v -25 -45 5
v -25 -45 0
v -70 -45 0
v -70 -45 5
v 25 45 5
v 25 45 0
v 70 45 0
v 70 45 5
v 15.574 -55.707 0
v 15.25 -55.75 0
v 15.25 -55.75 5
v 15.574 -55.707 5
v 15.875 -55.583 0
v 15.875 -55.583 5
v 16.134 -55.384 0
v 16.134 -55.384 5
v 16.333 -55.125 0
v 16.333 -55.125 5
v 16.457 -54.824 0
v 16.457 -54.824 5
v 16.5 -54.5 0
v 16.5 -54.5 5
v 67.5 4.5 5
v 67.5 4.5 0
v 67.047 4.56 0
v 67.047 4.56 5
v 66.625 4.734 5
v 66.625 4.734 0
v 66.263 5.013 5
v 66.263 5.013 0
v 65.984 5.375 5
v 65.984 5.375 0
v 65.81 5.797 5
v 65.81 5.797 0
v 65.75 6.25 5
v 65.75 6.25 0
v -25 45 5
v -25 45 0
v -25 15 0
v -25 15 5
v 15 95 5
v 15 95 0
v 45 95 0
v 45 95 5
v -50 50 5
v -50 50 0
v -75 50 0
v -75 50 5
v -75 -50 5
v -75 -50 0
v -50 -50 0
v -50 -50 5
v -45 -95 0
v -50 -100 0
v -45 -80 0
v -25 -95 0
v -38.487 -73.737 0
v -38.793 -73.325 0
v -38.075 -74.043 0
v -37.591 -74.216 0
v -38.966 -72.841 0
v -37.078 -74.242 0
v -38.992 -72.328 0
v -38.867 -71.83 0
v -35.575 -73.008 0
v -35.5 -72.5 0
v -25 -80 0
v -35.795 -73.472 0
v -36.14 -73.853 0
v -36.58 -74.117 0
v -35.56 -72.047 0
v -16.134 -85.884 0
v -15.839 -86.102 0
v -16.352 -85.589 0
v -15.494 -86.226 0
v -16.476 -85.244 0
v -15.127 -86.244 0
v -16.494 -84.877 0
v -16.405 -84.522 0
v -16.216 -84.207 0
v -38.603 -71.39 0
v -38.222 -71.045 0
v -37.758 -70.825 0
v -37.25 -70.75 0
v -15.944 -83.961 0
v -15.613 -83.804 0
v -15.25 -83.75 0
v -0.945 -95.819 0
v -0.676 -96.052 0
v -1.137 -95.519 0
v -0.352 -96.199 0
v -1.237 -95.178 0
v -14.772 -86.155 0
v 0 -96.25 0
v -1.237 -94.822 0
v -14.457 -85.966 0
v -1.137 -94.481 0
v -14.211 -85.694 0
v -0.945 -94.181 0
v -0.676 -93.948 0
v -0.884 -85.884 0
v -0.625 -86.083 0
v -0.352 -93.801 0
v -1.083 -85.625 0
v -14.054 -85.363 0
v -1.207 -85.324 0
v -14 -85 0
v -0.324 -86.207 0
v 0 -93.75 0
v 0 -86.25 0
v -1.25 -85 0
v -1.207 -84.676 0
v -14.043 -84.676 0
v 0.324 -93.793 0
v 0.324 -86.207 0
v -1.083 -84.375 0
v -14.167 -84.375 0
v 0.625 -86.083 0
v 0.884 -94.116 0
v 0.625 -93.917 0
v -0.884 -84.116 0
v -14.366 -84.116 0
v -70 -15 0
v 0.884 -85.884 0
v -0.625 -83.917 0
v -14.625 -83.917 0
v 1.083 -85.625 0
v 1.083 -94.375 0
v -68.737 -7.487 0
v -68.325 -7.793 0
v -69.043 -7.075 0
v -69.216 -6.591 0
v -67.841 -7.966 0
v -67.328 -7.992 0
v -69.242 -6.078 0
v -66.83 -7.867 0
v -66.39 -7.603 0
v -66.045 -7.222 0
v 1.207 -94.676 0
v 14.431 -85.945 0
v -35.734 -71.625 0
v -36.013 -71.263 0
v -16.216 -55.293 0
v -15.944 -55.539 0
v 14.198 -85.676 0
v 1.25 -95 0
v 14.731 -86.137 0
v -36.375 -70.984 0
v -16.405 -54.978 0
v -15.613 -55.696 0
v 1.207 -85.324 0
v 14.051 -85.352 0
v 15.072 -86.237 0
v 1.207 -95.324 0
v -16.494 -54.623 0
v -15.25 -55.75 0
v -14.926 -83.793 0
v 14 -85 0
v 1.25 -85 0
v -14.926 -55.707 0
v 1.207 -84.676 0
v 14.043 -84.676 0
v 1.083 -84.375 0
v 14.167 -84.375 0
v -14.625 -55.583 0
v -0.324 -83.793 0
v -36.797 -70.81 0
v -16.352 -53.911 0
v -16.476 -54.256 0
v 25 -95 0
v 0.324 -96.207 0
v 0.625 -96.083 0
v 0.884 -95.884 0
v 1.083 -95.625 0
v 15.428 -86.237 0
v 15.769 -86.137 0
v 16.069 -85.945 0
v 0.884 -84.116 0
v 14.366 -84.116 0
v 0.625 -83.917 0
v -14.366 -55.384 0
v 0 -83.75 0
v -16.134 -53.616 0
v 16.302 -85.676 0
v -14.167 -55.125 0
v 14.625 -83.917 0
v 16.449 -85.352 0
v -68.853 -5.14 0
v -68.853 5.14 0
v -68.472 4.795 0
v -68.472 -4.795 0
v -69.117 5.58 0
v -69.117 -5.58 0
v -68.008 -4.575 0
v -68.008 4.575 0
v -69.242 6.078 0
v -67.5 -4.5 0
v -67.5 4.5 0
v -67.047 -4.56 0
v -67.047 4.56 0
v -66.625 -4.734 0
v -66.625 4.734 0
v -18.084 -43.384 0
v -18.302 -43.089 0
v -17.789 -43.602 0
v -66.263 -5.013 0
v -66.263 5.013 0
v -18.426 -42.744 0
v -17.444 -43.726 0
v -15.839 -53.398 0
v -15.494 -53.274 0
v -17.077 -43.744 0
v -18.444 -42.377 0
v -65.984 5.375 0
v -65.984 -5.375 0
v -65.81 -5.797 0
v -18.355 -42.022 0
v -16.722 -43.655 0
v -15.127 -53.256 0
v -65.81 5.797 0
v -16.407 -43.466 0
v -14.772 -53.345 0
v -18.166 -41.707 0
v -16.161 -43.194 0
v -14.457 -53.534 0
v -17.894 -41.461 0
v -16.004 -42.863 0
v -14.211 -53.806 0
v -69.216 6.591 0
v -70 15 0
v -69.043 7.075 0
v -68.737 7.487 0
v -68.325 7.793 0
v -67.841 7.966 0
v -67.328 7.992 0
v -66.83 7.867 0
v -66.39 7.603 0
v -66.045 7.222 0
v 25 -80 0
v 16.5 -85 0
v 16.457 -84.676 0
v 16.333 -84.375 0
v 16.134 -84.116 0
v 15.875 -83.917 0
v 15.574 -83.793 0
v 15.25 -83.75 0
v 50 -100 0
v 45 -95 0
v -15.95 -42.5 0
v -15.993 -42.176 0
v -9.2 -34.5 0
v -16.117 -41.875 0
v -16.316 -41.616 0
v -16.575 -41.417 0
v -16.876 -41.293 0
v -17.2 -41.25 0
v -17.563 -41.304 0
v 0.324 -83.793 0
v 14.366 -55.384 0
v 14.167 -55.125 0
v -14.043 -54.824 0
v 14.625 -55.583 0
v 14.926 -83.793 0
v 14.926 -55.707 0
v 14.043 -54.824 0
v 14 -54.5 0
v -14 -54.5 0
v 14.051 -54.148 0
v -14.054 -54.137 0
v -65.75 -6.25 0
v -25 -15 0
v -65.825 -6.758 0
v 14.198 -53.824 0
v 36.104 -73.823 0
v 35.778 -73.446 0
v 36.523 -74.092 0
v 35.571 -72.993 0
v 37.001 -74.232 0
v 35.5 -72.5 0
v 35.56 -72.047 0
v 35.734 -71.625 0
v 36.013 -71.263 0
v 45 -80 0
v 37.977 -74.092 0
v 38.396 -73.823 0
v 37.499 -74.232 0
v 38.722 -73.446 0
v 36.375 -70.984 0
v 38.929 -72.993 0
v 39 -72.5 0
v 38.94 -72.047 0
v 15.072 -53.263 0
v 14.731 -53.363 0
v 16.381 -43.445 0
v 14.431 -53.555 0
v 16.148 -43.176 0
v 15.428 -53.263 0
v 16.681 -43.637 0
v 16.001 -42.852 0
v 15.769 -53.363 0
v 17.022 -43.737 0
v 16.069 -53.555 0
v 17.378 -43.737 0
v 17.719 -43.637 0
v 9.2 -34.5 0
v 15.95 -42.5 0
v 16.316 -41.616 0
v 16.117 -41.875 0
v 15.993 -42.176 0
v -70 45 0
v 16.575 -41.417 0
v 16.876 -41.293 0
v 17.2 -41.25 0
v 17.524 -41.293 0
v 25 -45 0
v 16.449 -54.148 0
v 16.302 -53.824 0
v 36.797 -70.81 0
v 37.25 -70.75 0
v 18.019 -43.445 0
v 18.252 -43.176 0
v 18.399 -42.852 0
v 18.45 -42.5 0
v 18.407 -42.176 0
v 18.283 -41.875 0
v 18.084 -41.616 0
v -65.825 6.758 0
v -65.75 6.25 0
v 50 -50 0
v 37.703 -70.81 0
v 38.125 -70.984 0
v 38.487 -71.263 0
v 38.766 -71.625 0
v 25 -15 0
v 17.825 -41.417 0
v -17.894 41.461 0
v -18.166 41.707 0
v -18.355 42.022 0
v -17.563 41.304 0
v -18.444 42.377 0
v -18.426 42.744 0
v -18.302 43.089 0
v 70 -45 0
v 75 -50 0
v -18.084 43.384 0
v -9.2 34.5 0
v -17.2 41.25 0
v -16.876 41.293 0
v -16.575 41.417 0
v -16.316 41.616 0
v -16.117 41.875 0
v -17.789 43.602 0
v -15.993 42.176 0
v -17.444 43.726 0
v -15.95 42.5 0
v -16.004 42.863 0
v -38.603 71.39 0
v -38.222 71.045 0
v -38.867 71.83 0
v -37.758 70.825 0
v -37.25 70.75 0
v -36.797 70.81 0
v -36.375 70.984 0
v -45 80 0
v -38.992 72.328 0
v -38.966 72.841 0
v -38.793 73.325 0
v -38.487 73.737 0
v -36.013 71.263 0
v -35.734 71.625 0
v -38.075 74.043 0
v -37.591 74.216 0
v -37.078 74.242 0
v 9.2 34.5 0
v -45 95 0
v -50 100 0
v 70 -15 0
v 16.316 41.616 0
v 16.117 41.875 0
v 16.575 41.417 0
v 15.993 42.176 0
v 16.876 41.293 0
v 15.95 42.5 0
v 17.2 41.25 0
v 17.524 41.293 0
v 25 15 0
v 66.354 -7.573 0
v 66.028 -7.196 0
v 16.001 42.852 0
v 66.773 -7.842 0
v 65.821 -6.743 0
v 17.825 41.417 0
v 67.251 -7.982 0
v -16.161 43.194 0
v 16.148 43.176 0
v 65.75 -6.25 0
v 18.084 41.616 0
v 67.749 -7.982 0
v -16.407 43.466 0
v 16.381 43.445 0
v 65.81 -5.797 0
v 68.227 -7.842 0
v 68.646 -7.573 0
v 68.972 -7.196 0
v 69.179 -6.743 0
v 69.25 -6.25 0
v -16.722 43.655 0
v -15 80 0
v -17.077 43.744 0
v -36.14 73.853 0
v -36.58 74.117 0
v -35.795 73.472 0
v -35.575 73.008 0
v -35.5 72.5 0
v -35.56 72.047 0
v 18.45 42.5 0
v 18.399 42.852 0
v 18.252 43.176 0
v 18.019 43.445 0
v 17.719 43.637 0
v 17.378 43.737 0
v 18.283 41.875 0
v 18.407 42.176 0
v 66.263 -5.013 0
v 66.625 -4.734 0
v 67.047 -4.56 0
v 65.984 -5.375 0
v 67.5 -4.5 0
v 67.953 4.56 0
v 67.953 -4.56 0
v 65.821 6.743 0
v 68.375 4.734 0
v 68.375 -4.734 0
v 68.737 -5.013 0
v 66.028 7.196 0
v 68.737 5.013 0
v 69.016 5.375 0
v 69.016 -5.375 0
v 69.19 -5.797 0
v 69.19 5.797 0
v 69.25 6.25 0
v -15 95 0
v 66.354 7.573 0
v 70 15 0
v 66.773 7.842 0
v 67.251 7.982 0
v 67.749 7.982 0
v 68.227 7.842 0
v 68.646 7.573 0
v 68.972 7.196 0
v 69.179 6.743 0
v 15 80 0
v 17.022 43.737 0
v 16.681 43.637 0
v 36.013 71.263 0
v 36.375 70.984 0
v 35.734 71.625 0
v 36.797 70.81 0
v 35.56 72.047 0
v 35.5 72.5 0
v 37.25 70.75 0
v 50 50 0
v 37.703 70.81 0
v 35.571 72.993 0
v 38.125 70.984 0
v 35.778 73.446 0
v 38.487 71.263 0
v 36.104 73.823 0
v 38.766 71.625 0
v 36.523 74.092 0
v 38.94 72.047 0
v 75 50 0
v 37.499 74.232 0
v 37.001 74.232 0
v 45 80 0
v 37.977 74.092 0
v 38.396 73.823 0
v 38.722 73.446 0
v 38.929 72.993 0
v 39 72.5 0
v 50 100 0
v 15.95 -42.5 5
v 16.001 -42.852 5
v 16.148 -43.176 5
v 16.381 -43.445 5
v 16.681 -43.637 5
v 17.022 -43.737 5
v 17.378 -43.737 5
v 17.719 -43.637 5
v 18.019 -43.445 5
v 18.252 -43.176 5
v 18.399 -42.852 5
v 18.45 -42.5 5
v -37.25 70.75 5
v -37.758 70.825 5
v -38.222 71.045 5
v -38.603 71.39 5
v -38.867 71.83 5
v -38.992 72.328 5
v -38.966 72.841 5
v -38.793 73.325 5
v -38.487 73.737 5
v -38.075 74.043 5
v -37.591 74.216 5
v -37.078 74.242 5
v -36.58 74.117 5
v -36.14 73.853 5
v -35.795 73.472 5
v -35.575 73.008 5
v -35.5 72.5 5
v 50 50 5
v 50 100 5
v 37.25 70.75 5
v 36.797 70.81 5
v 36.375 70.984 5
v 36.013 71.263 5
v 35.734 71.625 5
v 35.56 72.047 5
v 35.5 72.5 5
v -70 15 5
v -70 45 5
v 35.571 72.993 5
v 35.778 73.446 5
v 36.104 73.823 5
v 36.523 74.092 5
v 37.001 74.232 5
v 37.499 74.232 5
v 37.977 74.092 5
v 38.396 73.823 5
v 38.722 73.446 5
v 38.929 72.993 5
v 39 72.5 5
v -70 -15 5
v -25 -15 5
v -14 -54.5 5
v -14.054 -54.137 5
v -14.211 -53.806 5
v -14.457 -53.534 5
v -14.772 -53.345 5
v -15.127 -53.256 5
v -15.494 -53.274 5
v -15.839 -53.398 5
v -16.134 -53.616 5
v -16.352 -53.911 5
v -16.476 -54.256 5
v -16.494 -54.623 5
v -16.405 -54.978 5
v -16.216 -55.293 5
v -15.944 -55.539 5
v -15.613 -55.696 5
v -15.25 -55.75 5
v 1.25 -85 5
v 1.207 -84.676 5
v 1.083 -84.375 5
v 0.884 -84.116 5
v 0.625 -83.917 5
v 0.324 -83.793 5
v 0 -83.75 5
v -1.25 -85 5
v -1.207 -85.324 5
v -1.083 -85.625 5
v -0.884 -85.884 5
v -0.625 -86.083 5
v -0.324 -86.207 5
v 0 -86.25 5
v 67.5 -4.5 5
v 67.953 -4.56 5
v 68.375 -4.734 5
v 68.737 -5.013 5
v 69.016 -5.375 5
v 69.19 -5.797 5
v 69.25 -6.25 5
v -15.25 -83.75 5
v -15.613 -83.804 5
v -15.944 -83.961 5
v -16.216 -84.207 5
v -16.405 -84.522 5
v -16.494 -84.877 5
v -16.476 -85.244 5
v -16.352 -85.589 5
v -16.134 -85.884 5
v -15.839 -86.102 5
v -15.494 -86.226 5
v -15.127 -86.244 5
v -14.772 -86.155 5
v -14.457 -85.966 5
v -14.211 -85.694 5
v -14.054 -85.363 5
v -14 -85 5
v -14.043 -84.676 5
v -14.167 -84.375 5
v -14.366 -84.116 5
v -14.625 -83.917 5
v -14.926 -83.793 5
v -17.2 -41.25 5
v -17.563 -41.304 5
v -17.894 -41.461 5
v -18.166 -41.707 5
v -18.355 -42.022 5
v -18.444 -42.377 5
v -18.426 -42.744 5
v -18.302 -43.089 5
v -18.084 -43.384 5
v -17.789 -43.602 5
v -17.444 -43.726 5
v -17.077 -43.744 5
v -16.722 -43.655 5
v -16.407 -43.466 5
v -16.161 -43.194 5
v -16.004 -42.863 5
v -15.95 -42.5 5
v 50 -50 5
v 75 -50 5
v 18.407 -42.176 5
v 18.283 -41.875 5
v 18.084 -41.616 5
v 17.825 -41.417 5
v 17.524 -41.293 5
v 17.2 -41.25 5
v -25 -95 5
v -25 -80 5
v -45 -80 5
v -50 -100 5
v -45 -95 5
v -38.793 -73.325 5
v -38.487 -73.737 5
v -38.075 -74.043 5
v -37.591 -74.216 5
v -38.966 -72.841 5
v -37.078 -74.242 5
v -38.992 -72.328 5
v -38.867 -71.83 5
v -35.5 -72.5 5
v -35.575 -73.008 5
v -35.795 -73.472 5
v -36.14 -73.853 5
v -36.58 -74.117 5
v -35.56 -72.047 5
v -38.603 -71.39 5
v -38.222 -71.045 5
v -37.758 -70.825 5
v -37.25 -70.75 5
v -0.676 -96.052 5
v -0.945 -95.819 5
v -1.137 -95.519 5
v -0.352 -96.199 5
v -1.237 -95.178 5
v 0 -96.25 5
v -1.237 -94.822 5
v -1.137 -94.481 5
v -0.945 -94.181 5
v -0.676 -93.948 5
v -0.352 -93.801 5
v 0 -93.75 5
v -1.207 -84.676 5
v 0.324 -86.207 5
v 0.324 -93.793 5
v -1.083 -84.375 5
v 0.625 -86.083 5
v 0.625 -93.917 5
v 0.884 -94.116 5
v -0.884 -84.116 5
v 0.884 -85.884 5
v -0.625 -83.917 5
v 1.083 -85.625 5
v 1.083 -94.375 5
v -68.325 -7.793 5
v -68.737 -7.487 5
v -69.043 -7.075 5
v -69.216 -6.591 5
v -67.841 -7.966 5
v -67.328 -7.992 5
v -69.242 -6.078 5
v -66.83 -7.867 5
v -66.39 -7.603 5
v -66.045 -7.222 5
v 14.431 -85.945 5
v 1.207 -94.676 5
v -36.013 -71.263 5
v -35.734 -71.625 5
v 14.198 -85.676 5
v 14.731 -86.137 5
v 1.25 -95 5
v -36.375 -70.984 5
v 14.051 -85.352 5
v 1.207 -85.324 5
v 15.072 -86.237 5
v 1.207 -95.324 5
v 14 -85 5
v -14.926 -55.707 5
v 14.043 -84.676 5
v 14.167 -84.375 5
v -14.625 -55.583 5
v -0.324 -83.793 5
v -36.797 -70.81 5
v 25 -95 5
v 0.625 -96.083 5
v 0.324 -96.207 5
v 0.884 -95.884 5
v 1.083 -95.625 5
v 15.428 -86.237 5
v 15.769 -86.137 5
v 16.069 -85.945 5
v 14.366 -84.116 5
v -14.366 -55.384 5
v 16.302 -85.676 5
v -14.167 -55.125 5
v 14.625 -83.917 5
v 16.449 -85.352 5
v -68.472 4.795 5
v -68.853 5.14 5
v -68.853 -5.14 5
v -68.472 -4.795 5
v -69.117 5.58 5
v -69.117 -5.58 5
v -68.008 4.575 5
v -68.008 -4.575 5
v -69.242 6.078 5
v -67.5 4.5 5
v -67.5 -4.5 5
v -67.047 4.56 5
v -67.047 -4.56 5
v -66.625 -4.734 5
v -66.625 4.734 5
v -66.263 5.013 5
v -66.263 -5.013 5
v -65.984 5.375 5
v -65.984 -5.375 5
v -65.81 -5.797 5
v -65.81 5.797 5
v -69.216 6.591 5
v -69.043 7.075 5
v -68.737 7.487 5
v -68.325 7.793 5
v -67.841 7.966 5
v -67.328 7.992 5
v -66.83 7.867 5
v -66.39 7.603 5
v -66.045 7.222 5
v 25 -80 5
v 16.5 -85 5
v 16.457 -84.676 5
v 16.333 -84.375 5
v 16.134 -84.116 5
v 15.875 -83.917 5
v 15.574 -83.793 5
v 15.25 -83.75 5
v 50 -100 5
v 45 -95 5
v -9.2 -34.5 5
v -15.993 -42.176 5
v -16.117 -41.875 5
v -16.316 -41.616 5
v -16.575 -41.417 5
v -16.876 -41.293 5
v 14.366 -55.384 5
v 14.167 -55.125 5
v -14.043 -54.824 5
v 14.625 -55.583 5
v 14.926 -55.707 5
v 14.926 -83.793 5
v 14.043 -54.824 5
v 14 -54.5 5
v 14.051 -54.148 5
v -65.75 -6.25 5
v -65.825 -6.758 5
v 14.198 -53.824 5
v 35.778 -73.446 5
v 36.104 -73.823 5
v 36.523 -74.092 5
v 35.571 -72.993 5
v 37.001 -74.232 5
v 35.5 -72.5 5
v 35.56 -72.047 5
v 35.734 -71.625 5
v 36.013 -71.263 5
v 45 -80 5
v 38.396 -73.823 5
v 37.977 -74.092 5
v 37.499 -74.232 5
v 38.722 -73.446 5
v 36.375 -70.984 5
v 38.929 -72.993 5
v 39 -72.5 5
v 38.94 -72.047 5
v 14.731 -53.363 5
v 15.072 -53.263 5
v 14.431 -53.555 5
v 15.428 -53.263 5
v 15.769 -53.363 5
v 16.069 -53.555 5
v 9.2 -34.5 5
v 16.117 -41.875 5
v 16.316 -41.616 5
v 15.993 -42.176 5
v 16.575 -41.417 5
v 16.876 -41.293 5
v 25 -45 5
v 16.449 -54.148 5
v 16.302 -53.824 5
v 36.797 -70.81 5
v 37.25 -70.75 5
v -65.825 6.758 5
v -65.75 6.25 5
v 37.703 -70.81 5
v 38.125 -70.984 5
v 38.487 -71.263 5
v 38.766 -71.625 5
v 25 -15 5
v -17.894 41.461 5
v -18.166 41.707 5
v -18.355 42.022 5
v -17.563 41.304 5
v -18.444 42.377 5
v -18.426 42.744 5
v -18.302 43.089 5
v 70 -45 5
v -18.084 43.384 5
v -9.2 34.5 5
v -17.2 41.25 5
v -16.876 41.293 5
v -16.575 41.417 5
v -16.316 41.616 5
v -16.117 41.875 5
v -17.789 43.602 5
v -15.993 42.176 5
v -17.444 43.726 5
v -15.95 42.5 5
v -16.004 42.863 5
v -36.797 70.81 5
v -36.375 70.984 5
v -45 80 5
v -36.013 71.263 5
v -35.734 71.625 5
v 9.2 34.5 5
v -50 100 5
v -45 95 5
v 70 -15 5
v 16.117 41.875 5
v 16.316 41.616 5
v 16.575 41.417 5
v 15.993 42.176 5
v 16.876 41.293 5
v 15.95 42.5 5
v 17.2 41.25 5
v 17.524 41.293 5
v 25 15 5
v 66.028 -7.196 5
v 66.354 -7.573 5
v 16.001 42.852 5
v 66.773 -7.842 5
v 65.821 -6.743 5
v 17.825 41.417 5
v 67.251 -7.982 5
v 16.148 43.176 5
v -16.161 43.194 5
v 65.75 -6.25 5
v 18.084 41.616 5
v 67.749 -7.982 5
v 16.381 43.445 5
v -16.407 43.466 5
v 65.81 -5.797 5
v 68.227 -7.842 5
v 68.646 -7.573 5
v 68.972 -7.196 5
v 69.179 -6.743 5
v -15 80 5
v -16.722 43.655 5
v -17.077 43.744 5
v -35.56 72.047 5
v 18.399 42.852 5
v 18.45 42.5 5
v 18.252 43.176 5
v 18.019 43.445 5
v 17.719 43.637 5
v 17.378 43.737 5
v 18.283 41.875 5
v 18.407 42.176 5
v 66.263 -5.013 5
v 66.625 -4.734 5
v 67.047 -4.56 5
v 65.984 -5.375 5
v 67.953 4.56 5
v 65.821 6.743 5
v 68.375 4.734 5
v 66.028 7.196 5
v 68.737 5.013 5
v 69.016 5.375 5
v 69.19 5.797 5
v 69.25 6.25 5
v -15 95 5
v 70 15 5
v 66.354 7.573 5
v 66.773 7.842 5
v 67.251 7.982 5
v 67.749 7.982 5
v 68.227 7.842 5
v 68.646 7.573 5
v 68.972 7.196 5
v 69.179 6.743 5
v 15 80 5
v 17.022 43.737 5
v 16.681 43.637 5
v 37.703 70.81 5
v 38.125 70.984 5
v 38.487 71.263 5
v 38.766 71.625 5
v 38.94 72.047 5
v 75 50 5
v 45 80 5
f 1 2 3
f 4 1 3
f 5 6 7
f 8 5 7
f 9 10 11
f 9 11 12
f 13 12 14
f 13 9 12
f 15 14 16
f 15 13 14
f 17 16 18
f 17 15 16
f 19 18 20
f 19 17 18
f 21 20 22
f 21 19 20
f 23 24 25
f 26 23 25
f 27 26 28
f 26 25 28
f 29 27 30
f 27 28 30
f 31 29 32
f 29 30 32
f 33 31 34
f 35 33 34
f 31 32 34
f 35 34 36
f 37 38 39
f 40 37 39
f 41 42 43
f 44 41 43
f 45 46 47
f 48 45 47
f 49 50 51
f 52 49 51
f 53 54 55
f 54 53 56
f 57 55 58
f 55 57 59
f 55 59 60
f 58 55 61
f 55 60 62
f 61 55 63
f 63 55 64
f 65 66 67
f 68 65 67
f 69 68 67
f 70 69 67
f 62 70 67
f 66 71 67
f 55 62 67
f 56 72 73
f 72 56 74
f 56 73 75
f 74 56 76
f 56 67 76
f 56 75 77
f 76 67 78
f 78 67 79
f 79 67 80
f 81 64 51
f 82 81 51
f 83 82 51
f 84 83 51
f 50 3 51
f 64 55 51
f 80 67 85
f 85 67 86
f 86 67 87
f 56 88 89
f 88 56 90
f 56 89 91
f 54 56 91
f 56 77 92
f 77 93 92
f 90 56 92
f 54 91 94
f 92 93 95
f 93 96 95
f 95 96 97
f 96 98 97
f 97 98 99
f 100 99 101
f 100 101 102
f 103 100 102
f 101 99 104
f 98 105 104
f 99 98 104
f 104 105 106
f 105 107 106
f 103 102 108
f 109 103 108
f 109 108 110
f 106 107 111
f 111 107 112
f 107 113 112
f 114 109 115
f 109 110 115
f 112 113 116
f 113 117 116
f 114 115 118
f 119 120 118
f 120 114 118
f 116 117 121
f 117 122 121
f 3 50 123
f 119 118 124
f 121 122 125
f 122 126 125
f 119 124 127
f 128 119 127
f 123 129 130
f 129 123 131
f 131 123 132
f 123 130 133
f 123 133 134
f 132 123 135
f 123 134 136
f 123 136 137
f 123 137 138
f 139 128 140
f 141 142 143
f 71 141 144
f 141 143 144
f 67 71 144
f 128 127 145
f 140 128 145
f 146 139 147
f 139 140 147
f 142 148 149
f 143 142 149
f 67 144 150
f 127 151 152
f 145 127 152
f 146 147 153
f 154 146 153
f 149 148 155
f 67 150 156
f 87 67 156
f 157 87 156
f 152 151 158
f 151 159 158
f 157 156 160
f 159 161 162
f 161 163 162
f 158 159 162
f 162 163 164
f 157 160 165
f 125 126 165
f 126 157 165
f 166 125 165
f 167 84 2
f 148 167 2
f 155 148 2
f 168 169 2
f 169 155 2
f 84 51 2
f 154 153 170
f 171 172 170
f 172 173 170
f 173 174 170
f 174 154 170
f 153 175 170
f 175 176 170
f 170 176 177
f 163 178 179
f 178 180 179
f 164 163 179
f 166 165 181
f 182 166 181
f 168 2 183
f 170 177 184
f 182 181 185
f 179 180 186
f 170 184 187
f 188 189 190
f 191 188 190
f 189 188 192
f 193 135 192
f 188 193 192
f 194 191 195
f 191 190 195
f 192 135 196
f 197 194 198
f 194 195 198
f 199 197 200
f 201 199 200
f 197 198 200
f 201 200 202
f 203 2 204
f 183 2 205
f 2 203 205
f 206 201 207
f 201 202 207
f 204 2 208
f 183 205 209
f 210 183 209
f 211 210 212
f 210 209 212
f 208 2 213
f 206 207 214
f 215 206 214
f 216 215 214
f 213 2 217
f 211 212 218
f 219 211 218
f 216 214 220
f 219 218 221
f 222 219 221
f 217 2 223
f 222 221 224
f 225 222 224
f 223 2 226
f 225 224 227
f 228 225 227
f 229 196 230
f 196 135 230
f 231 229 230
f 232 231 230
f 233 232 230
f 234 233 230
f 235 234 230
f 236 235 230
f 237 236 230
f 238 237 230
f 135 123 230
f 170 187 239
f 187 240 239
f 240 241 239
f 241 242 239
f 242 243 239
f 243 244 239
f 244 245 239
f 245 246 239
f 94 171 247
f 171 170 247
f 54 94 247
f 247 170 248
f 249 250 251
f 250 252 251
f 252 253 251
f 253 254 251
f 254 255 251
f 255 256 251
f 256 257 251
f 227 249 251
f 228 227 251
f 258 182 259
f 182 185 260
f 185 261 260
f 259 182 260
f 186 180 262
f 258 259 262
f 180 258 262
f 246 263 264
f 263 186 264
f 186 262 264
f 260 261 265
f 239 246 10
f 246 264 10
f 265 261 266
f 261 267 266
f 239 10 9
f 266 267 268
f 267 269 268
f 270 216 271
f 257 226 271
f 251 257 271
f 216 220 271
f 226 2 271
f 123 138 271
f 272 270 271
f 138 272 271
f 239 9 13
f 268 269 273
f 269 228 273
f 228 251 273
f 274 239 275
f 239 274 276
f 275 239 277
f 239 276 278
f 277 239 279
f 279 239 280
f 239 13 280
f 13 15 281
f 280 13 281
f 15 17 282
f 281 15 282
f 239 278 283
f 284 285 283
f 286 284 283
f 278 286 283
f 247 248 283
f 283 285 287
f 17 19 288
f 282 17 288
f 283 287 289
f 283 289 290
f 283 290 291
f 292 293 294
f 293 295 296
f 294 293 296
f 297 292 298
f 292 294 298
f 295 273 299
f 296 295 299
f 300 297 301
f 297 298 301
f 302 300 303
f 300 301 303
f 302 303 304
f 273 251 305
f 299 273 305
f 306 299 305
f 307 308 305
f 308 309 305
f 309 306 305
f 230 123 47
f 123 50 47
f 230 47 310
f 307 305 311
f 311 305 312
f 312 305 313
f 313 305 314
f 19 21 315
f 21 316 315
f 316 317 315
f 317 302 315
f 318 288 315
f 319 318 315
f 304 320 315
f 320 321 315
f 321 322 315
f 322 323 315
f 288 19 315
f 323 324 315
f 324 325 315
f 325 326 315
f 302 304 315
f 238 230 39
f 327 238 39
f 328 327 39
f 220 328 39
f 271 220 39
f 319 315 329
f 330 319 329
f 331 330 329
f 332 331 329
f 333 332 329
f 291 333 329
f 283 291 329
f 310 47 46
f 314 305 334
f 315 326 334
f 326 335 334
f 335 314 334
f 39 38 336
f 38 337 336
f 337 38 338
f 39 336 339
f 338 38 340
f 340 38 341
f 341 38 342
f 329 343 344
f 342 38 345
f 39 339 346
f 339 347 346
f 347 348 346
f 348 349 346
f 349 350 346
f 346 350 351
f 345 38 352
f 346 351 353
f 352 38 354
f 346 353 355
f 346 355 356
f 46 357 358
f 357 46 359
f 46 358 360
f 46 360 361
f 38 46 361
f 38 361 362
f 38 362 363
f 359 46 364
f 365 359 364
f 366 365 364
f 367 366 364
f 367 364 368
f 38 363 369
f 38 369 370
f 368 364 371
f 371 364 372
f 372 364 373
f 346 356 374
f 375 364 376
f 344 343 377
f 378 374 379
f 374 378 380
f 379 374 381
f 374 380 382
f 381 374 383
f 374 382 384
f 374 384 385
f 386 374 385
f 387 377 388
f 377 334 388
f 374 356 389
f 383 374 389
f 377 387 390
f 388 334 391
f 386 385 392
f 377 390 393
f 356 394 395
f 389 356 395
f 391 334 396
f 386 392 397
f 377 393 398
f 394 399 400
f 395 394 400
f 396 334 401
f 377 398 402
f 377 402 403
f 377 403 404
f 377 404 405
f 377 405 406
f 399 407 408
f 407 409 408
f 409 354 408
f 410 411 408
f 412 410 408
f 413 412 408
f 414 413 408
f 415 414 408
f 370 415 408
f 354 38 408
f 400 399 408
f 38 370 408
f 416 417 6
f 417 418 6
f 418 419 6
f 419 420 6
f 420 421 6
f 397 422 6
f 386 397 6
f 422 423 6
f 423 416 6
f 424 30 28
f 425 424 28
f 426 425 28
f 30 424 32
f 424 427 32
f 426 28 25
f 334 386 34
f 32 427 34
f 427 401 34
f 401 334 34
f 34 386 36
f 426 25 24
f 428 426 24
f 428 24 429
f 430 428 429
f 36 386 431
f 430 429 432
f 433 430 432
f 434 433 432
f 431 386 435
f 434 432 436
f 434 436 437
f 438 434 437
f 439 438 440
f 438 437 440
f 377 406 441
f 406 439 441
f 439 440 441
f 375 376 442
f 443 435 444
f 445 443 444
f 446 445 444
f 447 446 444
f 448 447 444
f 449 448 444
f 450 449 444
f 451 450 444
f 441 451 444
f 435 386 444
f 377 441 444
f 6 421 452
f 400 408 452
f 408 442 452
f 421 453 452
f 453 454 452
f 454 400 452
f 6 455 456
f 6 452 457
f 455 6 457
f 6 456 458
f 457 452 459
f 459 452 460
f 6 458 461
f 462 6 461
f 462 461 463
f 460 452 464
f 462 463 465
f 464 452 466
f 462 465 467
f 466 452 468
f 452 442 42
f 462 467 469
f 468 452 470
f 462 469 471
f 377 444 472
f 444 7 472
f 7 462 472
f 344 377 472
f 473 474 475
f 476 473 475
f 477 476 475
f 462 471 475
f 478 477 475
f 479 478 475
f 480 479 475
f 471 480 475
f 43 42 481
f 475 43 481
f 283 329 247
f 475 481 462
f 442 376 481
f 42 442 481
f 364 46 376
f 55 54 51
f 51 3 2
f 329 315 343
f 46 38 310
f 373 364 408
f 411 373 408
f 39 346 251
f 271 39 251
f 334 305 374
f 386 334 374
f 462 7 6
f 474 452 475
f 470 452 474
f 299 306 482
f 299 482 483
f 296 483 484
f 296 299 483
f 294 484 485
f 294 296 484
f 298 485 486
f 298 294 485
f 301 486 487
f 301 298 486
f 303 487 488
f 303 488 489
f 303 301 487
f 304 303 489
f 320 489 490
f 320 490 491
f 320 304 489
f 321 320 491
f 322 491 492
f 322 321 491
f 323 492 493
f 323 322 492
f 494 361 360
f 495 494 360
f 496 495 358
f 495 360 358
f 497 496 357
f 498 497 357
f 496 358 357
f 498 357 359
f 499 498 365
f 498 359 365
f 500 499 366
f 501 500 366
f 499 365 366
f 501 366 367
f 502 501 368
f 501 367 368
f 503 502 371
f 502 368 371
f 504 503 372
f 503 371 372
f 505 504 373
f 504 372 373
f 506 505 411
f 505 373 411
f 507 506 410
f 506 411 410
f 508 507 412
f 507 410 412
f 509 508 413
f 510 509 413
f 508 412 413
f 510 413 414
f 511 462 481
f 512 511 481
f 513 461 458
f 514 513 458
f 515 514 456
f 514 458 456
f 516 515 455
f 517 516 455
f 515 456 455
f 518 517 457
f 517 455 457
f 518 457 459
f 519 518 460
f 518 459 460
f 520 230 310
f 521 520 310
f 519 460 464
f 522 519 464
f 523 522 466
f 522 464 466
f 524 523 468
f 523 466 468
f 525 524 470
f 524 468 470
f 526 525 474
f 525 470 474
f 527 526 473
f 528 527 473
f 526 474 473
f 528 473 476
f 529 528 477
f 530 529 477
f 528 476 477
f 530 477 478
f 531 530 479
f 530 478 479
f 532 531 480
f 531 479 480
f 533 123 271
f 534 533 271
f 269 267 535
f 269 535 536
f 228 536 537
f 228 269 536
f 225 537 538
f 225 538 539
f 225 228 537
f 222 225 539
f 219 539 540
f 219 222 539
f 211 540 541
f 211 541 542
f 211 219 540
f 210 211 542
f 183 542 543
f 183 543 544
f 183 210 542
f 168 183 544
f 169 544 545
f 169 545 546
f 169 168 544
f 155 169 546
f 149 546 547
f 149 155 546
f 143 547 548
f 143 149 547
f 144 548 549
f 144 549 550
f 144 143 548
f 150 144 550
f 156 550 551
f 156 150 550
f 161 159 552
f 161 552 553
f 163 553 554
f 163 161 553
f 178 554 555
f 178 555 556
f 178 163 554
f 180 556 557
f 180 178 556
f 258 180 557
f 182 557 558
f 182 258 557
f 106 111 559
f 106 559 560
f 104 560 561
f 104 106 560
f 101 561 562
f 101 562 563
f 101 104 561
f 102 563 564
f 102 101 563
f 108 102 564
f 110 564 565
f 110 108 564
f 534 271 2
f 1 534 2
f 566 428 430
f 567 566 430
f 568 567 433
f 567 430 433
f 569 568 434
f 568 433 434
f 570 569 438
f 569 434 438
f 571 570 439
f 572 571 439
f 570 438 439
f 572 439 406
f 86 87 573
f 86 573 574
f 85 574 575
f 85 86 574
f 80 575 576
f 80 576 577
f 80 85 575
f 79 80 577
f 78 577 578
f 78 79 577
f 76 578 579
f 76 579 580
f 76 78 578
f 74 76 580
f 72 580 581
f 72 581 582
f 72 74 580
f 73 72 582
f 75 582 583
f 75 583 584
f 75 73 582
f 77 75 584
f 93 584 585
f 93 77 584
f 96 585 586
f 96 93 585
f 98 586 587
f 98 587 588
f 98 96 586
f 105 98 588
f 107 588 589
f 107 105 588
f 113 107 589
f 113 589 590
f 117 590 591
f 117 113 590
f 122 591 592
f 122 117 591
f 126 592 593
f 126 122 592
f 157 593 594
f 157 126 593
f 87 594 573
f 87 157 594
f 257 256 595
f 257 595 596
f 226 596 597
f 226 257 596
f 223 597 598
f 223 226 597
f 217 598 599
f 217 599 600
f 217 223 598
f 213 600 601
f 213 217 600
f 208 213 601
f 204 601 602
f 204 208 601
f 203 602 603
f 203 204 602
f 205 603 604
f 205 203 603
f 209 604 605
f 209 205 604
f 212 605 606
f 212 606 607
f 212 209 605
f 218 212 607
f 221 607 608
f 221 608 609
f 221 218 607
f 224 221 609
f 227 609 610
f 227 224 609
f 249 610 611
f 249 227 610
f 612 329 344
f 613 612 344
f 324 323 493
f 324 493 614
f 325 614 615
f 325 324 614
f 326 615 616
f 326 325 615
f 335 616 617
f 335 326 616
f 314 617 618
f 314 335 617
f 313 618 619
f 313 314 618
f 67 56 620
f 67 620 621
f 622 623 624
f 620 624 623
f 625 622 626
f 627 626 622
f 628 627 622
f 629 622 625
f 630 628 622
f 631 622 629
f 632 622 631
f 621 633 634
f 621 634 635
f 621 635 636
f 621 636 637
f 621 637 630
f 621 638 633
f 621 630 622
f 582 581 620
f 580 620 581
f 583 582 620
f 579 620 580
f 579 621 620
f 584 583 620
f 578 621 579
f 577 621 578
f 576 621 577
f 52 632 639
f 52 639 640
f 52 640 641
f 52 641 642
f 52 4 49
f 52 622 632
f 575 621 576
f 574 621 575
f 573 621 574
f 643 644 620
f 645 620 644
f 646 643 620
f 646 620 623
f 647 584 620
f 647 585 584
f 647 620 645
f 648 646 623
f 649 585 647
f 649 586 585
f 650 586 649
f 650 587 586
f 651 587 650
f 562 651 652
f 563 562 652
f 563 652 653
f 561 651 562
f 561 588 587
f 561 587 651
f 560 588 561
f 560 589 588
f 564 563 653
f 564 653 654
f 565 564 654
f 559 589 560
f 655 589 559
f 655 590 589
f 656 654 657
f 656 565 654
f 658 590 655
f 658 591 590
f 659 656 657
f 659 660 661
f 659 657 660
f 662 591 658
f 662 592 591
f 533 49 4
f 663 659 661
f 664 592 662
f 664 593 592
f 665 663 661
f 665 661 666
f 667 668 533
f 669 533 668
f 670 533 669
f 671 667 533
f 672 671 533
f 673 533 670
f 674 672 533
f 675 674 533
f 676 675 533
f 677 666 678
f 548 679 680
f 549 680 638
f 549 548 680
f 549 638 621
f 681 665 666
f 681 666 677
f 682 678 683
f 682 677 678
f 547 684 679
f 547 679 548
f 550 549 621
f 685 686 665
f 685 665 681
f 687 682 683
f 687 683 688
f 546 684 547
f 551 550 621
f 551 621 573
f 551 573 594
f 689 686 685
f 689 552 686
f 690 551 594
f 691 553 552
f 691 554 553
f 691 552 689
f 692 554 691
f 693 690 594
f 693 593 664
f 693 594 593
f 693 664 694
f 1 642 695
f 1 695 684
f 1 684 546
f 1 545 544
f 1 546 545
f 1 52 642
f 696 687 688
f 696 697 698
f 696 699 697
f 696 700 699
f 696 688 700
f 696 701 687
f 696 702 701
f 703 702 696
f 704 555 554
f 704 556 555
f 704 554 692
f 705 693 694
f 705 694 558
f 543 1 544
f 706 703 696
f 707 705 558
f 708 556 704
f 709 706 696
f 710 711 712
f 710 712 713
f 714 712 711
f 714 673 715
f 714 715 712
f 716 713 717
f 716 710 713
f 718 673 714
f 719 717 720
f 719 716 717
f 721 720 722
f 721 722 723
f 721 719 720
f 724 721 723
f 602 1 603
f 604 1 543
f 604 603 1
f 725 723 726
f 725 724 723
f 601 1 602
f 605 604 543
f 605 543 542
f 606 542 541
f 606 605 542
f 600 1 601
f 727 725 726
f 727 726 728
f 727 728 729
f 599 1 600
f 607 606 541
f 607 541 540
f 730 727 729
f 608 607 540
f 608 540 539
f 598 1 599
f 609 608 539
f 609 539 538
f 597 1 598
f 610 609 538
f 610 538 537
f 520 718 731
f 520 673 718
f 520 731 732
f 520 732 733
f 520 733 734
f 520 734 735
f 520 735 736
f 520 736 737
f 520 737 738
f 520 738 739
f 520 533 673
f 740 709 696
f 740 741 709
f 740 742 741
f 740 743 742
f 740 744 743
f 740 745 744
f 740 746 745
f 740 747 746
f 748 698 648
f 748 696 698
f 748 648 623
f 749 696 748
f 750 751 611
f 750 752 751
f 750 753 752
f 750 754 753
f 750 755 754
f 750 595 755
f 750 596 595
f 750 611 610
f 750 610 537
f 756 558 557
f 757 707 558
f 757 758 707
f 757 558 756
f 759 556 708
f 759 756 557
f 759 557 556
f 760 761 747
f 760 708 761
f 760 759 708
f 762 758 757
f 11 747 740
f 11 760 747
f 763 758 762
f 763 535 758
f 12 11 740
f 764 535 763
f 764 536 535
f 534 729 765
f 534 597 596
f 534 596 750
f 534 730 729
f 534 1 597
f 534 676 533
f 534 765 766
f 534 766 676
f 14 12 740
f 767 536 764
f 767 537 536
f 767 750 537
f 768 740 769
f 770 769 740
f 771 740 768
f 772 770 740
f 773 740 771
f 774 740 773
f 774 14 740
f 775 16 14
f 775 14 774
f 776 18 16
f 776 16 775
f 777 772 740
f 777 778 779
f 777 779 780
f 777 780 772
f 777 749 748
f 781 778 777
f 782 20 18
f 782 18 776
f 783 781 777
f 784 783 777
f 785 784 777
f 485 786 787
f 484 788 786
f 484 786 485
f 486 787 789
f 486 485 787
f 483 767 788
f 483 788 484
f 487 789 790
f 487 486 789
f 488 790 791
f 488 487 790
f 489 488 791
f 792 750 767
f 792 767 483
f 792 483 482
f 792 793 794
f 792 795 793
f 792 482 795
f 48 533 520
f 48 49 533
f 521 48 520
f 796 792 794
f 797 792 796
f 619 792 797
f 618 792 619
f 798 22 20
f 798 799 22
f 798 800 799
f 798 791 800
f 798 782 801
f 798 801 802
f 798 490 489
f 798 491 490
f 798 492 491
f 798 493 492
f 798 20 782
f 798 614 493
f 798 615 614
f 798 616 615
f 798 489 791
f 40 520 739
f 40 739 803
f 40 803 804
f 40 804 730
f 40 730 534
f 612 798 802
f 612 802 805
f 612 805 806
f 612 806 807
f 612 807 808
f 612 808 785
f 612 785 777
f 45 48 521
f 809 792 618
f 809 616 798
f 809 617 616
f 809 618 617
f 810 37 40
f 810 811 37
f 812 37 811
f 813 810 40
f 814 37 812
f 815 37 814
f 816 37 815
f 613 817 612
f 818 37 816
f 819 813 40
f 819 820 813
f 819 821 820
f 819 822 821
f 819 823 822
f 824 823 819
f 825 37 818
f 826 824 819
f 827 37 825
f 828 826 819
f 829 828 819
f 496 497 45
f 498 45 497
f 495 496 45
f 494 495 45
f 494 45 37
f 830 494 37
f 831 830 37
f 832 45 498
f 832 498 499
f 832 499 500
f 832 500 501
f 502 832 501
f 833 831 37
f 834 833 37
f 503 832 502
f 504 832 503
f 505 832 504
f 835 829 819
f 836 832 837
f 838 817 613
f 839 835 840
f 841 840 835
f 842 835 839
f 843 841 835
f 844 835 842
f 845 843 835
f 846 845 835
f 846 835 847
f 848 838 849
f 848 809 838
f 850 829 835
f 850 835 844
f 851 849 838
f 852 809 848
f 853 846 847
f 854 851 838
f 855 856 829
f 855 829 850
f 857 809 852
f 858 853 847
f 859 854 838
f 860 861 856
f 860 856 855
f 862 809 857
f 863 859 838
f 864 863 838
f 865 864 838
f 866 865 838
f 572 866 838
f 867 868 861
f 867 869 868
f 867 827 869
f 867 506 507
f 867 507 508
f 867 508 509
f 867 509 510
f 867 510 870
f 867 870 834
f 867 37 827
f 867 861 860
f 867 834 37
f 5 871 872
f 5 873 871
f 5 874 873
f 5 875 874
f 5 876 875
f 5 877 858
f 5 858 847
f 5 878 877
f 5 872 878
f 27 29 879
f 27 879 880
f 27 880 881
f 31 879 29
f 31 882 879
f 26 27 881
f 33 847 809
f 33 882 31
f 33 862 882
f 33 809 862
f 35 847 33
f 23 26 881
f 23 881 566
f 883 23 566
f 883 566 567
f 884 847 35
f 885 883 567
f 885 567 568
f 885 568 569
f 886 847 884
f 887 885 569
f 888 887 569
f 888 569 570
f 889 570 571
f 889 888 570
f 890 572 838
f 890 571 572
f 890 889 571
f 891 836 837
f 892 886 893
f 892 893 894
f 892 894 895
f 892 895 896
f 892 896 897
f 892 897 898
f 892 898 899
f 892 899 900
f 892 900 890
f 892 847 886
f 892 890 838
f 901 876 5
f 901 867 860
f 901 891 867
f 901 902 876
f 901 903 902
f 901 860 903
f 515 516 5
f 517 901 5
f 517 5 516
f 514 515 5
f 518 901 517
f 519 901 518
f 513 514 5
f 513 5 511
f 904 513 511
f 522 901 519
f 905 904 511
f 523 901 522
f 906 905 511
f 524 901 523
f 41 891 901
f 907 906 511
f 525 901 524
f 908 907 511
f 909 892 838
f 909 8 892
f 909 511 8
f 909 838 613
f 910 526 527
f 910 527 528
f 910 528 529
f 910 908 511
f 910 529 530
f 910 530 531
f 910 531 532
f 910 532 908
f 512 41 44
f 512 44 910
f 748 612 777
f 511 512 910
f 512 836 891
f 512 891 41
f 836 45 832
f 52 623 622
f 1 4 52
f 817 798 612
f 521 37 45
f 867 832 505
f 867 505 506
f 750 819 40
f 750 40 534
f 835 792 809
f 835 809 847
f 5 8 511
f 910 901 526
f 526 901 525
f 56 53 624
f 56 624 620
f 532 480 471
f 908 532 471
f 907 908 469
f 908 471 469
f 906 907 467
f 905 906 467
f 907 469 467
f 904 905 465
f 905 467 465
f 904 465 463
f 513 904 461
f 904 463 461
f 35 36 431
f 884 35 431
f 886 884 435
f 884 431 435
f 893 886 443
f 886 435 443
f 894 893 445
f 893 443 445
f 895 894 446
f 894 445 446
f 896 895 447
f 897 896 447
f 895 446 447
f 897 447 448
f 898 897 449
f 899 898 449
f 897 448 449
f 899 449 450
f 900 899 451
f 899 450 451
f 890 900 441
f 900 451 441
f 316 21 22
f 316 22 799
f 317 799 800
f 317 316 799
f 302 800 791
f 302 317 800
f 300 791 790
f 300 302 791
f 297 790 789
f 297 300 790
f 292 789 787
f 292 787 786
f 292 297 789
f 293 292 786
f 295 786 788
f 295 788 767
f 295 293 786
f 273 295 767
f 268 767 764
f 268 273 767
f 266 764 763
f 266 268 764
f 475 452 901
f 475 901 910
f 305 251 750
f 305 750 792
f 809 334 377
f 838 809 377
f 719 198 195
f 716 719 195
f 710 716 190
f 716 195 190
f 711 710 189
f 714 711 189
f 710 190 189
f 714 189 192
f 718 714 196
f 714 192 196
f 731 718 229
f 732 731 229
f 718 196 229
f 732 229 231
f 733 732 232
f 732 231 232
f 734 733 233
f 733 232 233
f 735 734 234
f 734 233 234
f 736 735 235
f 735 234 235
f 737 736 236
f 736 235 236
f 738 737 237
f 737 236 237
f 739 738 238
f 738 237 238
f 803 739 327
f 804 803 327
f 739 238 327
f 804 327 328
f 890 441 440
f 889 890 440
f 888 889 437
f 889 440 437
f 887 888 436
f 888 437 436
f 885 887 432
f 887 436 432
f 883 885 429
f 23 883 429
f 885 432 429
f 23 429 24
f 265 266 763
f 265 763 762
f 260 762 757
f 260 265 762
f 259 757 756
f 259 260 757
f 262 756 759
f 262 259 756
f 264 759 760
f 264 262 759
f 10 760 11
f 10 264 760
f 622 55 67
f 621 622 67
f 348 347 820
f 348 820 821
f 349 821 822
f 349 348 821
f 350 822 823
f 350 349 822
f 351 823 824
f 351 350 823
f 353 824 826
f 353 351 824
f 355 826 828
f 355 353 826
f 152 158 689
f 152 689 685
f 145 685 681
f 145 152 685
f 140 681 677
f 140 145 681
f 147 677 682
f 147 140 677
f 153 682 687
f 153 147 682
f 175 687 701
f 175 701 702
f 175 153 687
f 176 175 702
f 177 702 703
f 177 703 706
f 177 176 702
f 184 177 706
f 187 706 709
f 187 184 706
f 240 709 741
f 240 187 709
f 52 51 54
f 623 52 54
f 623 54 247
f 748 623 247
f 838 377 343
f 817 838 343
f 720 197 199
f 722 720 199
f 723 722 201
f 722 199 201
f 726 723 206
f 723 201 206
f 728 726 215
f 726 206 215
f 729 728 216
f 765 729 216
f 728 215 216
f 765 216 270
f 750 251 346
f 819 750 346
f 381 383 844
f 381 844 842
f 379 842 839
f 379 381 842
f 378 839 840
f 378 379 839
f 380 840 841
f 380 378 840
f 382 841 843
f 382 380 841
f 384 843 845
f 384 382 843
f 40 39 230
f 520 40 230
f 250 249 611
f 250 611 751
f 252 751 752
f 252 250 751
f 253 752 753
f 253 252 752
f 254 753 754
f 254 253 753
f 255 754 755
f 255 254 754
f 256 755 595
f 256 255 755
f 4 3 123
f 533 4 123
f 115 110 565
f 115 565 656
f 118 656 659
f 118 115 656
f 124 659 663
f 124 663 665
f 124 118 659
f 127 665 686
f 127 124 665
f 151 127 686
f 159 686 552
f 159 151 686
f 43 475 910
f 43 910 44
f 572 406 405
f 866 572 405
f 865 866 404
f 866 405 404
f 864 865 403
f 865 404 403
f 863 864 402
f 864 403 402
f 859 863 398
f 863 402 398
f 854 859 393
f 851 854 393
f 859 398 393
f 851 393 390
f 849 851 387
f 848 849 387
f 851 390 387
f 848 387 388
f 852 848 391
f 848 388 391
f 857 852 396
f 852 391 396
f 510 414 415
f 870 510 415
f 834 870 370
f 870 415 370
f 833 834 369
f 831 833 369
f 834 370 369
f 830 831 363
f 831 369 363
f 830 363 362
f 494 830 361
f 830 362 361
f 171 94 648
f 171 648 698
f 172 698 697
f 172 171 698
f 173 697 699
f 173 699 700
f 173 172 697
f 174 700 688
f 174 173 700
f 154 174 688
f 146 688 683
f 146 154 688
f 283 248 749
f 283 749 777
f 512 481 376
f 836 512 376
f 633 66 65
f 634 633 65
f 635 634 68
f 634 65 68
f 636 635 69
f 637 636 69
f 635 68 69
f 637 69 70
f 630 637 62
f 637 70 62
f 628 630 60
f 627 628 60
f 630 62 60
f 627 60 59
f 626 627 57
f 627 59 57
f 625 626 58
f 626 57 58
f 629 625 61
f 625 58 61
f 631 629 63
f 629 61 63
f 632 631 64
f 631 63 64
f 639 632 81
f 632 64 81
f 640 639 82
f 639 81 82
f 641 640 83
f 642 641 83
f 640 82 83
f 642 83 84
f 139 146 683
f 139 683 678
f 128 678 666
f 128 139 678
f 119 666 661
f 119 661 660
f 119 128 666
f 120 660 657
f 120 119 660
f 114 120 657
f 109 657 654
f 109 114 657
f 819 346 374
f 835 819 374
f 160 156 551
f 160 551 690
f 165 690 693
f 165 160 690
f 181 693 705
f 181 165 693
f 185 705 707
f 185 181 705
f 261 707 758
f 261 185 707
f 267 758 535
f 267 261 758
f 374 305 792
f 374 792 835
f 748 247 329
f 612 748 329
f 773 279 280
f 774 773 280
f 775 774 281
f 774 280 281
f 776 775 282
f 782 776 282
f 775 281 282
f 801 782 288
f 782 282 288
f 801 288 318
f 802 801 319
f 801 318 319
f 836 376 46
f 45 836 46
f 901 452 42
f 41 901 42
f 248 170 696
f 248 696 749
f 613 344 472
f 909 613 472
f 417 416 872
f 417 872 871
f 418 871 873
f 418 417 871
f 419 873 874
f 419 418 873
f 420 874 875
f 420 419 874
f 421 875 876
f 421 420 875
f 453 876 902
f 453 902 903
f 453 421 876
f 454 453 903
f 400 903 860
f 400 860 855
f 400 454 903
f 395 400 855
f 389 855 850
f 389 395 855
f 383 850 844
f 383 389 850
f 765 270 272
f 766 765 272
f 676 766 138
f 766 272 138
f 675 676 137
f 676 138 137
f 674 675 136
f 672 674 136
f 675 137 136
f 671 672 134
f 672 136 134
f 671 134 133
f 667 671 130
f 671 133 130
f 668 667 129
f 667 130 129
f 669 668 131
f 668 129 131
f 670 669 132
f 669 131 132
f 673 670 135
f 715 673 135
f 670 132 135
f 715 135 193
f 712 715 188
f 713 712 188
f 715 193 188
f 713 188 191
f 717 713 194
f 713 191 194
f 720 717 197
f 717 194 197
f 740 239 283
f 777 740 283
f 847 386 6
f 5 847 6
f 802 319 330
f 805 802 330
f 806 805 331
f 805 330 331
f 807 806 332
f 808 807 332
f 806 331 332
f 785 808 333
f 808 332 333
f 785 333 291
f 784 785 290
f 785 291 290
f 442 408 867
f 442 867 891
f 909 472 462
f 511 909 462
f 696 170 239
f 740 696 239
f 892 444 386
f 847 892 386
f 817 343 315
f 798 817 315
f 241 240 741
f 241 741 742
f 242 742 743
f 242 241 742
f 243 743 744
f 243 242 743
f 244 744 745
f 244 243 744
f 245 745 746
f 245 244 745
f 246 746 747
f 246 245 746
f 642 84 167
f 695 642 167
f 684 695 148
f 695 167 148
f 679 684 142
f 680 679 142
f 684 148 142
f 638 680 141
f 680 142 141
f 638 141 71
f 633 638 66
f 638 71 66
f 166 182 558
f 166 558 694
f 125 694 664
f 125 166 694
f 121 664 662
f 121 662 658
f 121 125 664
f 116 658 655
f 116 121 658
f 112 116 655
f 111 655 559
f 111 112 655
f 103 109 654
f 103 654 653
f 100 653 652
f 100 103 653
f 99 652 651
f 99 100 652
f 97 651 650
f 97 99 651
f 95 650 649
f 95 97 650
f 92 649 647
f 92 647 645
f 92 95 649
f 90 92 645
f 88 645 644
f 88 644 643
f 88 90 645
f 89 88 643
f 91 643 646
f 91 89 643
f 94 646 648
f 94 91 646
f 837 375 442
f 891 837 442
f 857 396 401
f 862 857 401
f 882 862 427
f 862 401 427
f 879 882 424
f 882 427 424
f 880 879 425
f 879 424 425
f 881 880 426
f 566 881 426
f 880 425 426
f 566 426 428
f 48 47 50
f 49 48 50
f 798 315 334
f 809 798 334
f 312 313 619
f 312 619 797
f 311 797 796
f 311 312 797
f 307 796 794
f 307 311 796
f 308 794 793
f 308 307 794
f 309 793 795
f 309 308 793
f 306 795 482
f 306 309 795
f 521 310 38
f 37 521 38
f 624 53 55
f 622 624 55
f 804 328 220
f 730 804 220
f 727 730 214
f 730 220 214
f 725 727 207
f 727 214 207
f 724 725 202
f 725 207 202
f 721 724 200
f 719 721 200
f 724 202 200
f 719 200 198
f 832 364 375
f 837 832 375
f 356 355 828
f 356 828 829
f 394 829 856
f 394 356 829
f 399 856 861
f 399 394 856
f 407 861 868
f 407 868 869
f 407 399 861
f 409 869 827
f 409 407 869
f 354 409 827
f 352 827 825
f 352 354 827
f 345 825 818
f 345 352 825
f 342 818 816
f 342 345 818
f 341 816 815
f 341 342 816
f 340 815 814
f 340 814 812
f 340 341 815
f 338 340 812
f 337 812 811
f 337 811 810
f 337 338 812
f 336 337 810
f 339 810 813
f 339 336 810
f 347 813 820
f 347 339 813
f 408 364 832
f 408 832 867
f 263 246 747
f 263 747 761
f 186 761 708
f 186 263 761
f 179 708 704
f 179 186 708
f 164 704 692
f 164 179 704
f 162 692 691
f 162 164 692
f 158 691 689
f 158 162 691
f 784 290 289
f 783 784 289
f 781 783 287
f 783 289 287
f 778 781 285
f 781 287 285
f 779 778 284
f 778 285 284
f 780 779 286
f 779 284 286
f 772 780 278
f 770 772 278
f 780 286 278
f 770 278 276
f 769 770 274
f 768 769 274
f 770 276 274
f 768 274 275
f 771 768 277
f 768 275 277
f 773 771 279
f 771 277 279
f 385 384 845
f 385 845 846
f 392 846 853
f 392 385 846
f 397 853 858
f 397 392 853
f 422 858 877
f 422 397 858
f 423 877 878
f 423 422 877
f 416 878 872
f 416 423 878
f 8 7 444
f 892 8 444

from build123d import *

# Parameters (mm, degrees)
F1_W     = 30
F1_H     = 15
F1_W_2   = 12.75
F1_H_2   = 5
F1_W_3   = 20
F1_W_4   = 74.5
F1_H_3   = 12.5
F1_H_4   = 8.75
F3_DEPTH = 5
F2_W     = 18.4
F2_H     = 69
F4_DEPTH = 5


with BuildPart() as f3:
    # F1 (on Top) → F3 (new body)
    with BuildSketch(Plane.XY):
        with BuildLine():
            Line((50, 100), (-50, 100))
            Line((-50, 100), (-50, 50))
            Line((-50, 50), (-37.25, 50))
            Line((-37.25, 50), (-37.25, 70.75))
            ThreePointArc((-37.25, 70.75), (-38.4874368671, 73.7374368671), (-35.5, 72.5))
            Line((-35.5, 72.5), (35.5, 72.5))
            ThreePointArc((35.5, 72.5), (37.25, 74.25), (39, 72.5))
            ThreePointArc((39, 72.5), (38.4874368671, 71.2625631329), (37.25, 70.75))
            Line((37.25, 70.75), (37.25, 50))
            Line((37.25, 50), (50, 50))
            Line((50, 50), (50, 100))
        make_face()
        with Locations((-30, 87.5)):
            Rectangle(F1_W, F1_H, mode=Mode.SUBTRACT)
        with Locations((30, 87.5)):
            Rectangle(F1_W, F1_H, mode=Mode.SUBTRACT)
        with Locations((-43.625, 47.5)):
            Rectangle(F1_W_2, F1_H_2)
        with BuildLine():
            Line((-50, 45), (-50, 50))
            Line((-50, 50), (-75, 50))
            Line((-75, 50), (-75, -50))
            Line((-75, -50), (-50, -50))
            Line((-50, -50), (-50, -45))
            Line((-50, -45), (-70, -45))
            Line((-70, -45), (-70, -15))
            Line((-70, -15), (-50, -15))
            Line((-50, -15), (-50, -6.25))
            Line((-50, -6.25), (-65.75, -6.25))
            ThreePointArc((-65.75, -6.25), (-68.7374368671, -7.4874368671), (-67.5, -4.5))
            Line((-67.5, -4.5), (-67.5, 4.5))
            ThreePointArc((-67.5, 4.5), (-68.7374368671, 7.4874368671), (-65.75, 6.25))
            Line((-65.75, 6.25), (-50, 6.25))
            Line((-50, 6.25), (-50, 15))
            Line((-50, 15), (-70, 15))
            Line((-70, 15), (-70, 45))
            Line((-70, 45), (-50, 45))
        make_face()
        with BuildLine():
            Line((75, 50), (50, 50))
            Line((50, 50), (50, 45))
            Line((50, 45), (70, 45))
            Line((70, 45), (70, 15))
            Line((70, 15), (50, 15))
            Line((50, 15), (50, 6.25))
            Line((50, 6.25), (65.75, 6.25))
            ThreePointArc((65.75, 6.25), (67.5, 8), (69.25, 6.25))
            ThreePointArc((69.25, 6.25), (68.7374368671, 5.0125631329), (67.5, 4.5))
            Line((67.5, 4.5), (67.5, -4.5))
            ThreePointArc((67.5, -4.5), (68.7374368671, -5.0125631329), (69.25, -6.25))
            ThreePointArc((69.25, -6.25), (67.5, -8), (65.75, -6.25))
            Line((65.75, -6.25), (50, -6.25))
            Line((50, -6.25), (50, -15))
            Line((50, -15), (70, -15))
            Line((70, -15), (70, -45))
            Line((70, -45), (50, -45))
            Line((50, -45), (50, -50))
            Line((50, -50), (75, -50))
            Line((75, -50), (75, 50))
        make_face()
        with Locations((43.625, 47.5)):
            Rectangle(F1_W_2, F1_H_2)
        with BuildLine():
            Line((-37.25, -50), (-50, -50))
            Line((-50, -50), (-50, -100))
            Line((-50, -100), (50, -100))
            Line((50, -100), (50, -50))
            Line((50, -50), (37.25, -50))
            Line((37.25, -50), (37.25, -70.75))
            ThreePointArc((37.25, -70.75), (38.4874368671, -71.2625631329), (39, -72.5))
            ThreePointArc((39, -72.5), (37.25, -74.25), (35.5, -72.5))
            Line((35.5, -72.5), (-35.5, -72.5))
            ThreePointArc((-35.5, -72.5), (-38.4874368671, -73.7374368671), (-37.25, -70.75))
            Line((-37.25, -70.75), (-37.25, -50))
        make_face()
        with Locations((-35, -87.5)):
            Rectangle(F1_W_3, F1_H, mode=Mode.SUBTRACT)
        with Locations((35, -87.5)):
            Rectangle(F1_W_3, F1_H, mode=Mode.SUBTRACT)
        with Locations((-43.625, -47.5)):
            Rectangle(F1_W_2, F1_H_2)
        with Locations((43.625, -47.5)):
            Rectangle(F1_W_2, F1_H_2)
        with BuildLine():
            Line((37.25, -50), (-37.25, -50))
            Line((-37.25, -50), (-37.25, -70.75))
            ThreePointArc((-37.25, -70.75), (-36.0125631329, -71.2625631329), (-35.5, -72.5))
            Line((-35.5, -72.5), (35.5, -72.5))
            ThreePointArc((35.5, -72.5), (36.0125631329, -71.2625631329), (37.25, -70.75))
            Line((37.25, -70.75), (37.25, -50))
        make_face()
        Polygon((-37.25, -45), (-37.25, -50), (37.25, -50), (37.25, -45), (25, -45), (25, -15), (37.25, -15), (37.25, -6.25), (-37.25, -6.25), (-37.25, -15), (-25, -15), (-25, -45), align=None)
        Polygon((37.25, 50), (-37.25, 50), (-37.25, 45), (-25, 45), (-25, 15), (-37.25, 15), (-37.25, 6.25), (37.25, 6.25), (37.25, 15), (25, 15), (25, 45), (37.25, 45), align=None)
        with BuildLine():
            Line((-37.25, 70.75), (-37.25, 50))
            Line((-37.25, 50), (37.25, 50))
            Line((37.25, 50), (37.25, 70.75))
            ThreePointArc((37.25, 70.75), (36.0125631329, 71.2625631329), (35.5, 72.5))
            Line((35.5, 72.5), (-35.5, 72.5))
            ThreePointArc((-35.5, 72.5), (-36.0125631329, 71.2625631329), (-37.25, 70.75))
        make_face()
        Rectangle(F1_W_4, F1_H_3)
        with Locations((-43.625, 10.625)):
            Rectangle(F1_W_2, F1_H_4)
        with Locations((-43.625, -10.625)):
            Rectangle(F1_W_2, F1_H_4)
        with Locations((-43.625, 0)):
            Rectangle(F1_W_2, F1_H_3)
        with Locations((43.625, -10.625)):
            Rectangle(F1_W_2, F1_H_4)
        with Locations((43.625, 0)):
            Rectangle(F1_W_2, F1_H_3)
        with Locations((43.625, 10.625)):
            Rectangle(F1_W_2, F1_H_4)
        with BuildLine():
            Line((65.75, 6.25), (50, 6.25))
            Line((50, 6.25), (50, -6.25))
            Line((50, -6.25), (65.75, -6.25))
            ThreePointArc((65.75, -6.25), (66.2625631329, -5.0125631329), (67.5, -4.5))
            Line((67.5, -4.5), (67.5, 4.5))
            ThreePointArc((67.5, 4.5), (66.2625631329, 5.0125631329), (65.75, 6.25))
        make_face()
        with BuildLine():
            Line((-50, -6.25), (-50, 6.25))
            Line((-50, 6.25), (-65.75, 6.25))
            ThreePointArc((-65.75, 6.25), (-66.2625631329, 5.0125631329), (-67.5, 4.5))
            Line((-67.5, 4.5), (-67.5, -4.5))
            ThreePointArc((-67.5, -4.5), (-66.2625631329, -5.0125631329), (-65.75, -6.25))
            Line((-65.75, -6.25), (-50, -6.25))
        make_face()
    extrude(amount=F3_DEPTH)

    # F2 (on face) → F4 (cut)
    with BuildSketch(Plane.XY):
        with BuildLine():
            Line((15.25, -85), (14, -85))
            ThreePointArc((14, -85), (15.25, -86.25), (16.5, -85))
            ThreePointArc((16.5, -85), (16.1338834765, -84.1161165235), (15.25, -83.75))
            Line((15.25, -83.75), (15.25, -85))
        make_face()
        with BuildLine():
            ThreePointArc((-1.25, -85), (-0.8838834765, -85.8838834765), (0, -86.25))
            Line((0, -86.25), (0, -85))
            Line((0, -85), (-1.25, -85))
        make_face()
        with BuildLine():
            Line((0, -83.75), (0, -85))
            Line((0, -85), (1.25, -85))
            ThreePointArc((1.25, -85), (0.8838834765, -84.1161165235), (0, -83.75))
        make_face()
        with BuildLine():
            Line((0, -85), (0, -86.25))
            ThreePointArc((0, -86.25), (0.8838834765, -85.8838834765), (1.25, -85))
            Line((1.25, -85), (0, -85))
        make_face()
        with BuildLine():
            Line((-1.25, -85), (0, -85))
            Line((0, -85), (0, -83.75))
            ThreePointArc((0, -83.75), (-0.8838834765, -84.1161165235), (-1.25, -85))
        make_face()
        with BuildLine():
            ThreePointArc((0, -93.75), (-1.25, -95), (0, -96.25))
            Line((0, -96.25), (0, -93.75))
        make_face()
        with BuildLine():
            Line((0, -93.75), (0, -96.25))
            ThreePointArc((0, -96.25), (0.8838834765, -95.8838834765), (1.25, -95))
            ThreePointArc((1.25, -95), (0.8838834765, -94.1161165235), (0, -93.75))
        make_face()
        with BuildLine():
            ThreePointArc((15.25, -83.75), (14.3661165235, -84.1161165235), (14, -85))
            Line((14, -85), (15.25, -85))
            Line((15.25, -85), (15.25, -83.75))
        make_face()
        with BuildLine():
            ThreePointArc((-15.25, -83.75), (-16.1338834765, -85.8838834765), (-14, -85))
            Line((-14, -85), (-15.25, -85))
            Line((-15.25, -85), (-15.25, -83.75))
        make_face()
        with BuildLine():
            Line((-15.25, -85), (-14, -85))
            ThreePointArc((-14, -85), (-14.3661165235, -84.1161165235), (-15.25, -83.75))
            Line((-15.25, -83.75), (-15.25, -85))
        make_face()
        with BuildLine():
            Line((15.25, -54.5), (15.25, -55.75))
            ThreePointArc((15.25, -55.75), (16.1338834765, -55.3838834765), (16.5, -54.5))
            ThreePointArc((16.5, -54.5), (15.25, -53.25), (14, -54.5))
            Line((14, -54.5), (15.25, -54.5))
        make_face()
        with BuildLine():
            ThreePointArc((14, -54.5), (14.3661165235, -55.3838834765), (15.25, -55.75))
            Line((15.25, -55.75), (15.25, -54.5))
            Line((15.25, -54.5), (14, -54.5))
        make_face()
        with BuildLine():
            Line((-15.25, -54.5), (-15.25, -55.75))
            ThreePointArc((-15.25, -55.75), (-14.3661165235, -55.3838834765), (-14, -54.5))
            Line((-14, -54.5), (-15.25, -54.5))
        make_face()
        with BuildLine():
            ThreePointArc((-14, -54.5), (-16.1338834765, -53.6161165235), (-15.25, -55.75))
            Line((-15.25, -55.75), (-15.25, -54.5))
            Line((-15.25, -54.5), (-14, -54.5))
        make_face()
        with BuildLine():
            Line((17.2, -42.5), (15.95, -42.5))
            ThreePointArc((15.95, -42.5), (17.2, -43.75), (18.45, -42.5))
            ThreePointArc((18.45, -42.5), (18.0838834765, -41.6161165235), (17.2, -41.25))
            Line((17.2, -41.25), (17.2, -42.5))
        make_face()
        with BuildLine():
            ThreePointArc((17.2, -41.25), (16.3161165235, -41.6161165235), (15.95, -42.5))
            Line((15.95, -42.5), (17.2, -42.5))
            Line((17.2, -42.5), (17.2, -41.25))
        make_face()
        with BuildLine():
            Line((-17.2, -42.5), (-15.95, -42.5))
            ThreePointArc((-15.95, -42.5), (-16.3161165235, -41.6161165235), (-17.2, -41.25))
            Line((-17.2, -41.25), (-17.2, -42.5))
        make_face()
        with BuildLine():
            ThreePointArc((-17.2, -41.25), (-18.0838834765, -43.3838834765), (-15.95, -42.5))
            Line((-15.95, -42.5), (-17.2, -42.5))
            Line((-17.2, -42.5), (-17.2, -41.25))
        make_face()
        with BuildLine():
            ThreePointArc((-15.95, 42.5), (-18.0838834765, 43.3838834765), (-17.2, 41.25))
            Line((-17.2, 41.25), (-17.2, 42.5))
            Line((-17.2, 42.5), (-15.95, 42.5))
        make_face()
        with BuildLine():
            Line((-17.2, 42.5), (-17.2, 41.25))
            ThreePointArc((-17.2, 41.25), (-16.3161165235, 41.6161165235), (-15.95, 42.5))
            Line((-15.95, 42.5), (-17.2, 42.5))
        make_face()
        with BuildLine():
            ThreePointArc((15.95, 42.5), (16.3161165235, 41.6161165235), (17.2, 41.25))
            Line((17.2, 41.25), (17.2, 42.5))
            Line((17.2, 42.5), (15.95, 42.5))
        make_face()
        with BuildLine():
            Line((17.2, 42.5), (17.2, 41.25))
            ThreePointArc((17.2, 41.25), (18.0838834765, 41.6161165235), (18.45, 42.5))
            ThreePointArc((18.45, 42.5), (17.2, 43.75), (15.95, 42.5))
            Line((15.95, 42.5), (17.2, 42.5))
        make_face()
        Rectangle(F2_W, F2_H)
    extrude(amount=F4_DEPTH, mode=Mode.SUBTRACT)


solid = f3.part
